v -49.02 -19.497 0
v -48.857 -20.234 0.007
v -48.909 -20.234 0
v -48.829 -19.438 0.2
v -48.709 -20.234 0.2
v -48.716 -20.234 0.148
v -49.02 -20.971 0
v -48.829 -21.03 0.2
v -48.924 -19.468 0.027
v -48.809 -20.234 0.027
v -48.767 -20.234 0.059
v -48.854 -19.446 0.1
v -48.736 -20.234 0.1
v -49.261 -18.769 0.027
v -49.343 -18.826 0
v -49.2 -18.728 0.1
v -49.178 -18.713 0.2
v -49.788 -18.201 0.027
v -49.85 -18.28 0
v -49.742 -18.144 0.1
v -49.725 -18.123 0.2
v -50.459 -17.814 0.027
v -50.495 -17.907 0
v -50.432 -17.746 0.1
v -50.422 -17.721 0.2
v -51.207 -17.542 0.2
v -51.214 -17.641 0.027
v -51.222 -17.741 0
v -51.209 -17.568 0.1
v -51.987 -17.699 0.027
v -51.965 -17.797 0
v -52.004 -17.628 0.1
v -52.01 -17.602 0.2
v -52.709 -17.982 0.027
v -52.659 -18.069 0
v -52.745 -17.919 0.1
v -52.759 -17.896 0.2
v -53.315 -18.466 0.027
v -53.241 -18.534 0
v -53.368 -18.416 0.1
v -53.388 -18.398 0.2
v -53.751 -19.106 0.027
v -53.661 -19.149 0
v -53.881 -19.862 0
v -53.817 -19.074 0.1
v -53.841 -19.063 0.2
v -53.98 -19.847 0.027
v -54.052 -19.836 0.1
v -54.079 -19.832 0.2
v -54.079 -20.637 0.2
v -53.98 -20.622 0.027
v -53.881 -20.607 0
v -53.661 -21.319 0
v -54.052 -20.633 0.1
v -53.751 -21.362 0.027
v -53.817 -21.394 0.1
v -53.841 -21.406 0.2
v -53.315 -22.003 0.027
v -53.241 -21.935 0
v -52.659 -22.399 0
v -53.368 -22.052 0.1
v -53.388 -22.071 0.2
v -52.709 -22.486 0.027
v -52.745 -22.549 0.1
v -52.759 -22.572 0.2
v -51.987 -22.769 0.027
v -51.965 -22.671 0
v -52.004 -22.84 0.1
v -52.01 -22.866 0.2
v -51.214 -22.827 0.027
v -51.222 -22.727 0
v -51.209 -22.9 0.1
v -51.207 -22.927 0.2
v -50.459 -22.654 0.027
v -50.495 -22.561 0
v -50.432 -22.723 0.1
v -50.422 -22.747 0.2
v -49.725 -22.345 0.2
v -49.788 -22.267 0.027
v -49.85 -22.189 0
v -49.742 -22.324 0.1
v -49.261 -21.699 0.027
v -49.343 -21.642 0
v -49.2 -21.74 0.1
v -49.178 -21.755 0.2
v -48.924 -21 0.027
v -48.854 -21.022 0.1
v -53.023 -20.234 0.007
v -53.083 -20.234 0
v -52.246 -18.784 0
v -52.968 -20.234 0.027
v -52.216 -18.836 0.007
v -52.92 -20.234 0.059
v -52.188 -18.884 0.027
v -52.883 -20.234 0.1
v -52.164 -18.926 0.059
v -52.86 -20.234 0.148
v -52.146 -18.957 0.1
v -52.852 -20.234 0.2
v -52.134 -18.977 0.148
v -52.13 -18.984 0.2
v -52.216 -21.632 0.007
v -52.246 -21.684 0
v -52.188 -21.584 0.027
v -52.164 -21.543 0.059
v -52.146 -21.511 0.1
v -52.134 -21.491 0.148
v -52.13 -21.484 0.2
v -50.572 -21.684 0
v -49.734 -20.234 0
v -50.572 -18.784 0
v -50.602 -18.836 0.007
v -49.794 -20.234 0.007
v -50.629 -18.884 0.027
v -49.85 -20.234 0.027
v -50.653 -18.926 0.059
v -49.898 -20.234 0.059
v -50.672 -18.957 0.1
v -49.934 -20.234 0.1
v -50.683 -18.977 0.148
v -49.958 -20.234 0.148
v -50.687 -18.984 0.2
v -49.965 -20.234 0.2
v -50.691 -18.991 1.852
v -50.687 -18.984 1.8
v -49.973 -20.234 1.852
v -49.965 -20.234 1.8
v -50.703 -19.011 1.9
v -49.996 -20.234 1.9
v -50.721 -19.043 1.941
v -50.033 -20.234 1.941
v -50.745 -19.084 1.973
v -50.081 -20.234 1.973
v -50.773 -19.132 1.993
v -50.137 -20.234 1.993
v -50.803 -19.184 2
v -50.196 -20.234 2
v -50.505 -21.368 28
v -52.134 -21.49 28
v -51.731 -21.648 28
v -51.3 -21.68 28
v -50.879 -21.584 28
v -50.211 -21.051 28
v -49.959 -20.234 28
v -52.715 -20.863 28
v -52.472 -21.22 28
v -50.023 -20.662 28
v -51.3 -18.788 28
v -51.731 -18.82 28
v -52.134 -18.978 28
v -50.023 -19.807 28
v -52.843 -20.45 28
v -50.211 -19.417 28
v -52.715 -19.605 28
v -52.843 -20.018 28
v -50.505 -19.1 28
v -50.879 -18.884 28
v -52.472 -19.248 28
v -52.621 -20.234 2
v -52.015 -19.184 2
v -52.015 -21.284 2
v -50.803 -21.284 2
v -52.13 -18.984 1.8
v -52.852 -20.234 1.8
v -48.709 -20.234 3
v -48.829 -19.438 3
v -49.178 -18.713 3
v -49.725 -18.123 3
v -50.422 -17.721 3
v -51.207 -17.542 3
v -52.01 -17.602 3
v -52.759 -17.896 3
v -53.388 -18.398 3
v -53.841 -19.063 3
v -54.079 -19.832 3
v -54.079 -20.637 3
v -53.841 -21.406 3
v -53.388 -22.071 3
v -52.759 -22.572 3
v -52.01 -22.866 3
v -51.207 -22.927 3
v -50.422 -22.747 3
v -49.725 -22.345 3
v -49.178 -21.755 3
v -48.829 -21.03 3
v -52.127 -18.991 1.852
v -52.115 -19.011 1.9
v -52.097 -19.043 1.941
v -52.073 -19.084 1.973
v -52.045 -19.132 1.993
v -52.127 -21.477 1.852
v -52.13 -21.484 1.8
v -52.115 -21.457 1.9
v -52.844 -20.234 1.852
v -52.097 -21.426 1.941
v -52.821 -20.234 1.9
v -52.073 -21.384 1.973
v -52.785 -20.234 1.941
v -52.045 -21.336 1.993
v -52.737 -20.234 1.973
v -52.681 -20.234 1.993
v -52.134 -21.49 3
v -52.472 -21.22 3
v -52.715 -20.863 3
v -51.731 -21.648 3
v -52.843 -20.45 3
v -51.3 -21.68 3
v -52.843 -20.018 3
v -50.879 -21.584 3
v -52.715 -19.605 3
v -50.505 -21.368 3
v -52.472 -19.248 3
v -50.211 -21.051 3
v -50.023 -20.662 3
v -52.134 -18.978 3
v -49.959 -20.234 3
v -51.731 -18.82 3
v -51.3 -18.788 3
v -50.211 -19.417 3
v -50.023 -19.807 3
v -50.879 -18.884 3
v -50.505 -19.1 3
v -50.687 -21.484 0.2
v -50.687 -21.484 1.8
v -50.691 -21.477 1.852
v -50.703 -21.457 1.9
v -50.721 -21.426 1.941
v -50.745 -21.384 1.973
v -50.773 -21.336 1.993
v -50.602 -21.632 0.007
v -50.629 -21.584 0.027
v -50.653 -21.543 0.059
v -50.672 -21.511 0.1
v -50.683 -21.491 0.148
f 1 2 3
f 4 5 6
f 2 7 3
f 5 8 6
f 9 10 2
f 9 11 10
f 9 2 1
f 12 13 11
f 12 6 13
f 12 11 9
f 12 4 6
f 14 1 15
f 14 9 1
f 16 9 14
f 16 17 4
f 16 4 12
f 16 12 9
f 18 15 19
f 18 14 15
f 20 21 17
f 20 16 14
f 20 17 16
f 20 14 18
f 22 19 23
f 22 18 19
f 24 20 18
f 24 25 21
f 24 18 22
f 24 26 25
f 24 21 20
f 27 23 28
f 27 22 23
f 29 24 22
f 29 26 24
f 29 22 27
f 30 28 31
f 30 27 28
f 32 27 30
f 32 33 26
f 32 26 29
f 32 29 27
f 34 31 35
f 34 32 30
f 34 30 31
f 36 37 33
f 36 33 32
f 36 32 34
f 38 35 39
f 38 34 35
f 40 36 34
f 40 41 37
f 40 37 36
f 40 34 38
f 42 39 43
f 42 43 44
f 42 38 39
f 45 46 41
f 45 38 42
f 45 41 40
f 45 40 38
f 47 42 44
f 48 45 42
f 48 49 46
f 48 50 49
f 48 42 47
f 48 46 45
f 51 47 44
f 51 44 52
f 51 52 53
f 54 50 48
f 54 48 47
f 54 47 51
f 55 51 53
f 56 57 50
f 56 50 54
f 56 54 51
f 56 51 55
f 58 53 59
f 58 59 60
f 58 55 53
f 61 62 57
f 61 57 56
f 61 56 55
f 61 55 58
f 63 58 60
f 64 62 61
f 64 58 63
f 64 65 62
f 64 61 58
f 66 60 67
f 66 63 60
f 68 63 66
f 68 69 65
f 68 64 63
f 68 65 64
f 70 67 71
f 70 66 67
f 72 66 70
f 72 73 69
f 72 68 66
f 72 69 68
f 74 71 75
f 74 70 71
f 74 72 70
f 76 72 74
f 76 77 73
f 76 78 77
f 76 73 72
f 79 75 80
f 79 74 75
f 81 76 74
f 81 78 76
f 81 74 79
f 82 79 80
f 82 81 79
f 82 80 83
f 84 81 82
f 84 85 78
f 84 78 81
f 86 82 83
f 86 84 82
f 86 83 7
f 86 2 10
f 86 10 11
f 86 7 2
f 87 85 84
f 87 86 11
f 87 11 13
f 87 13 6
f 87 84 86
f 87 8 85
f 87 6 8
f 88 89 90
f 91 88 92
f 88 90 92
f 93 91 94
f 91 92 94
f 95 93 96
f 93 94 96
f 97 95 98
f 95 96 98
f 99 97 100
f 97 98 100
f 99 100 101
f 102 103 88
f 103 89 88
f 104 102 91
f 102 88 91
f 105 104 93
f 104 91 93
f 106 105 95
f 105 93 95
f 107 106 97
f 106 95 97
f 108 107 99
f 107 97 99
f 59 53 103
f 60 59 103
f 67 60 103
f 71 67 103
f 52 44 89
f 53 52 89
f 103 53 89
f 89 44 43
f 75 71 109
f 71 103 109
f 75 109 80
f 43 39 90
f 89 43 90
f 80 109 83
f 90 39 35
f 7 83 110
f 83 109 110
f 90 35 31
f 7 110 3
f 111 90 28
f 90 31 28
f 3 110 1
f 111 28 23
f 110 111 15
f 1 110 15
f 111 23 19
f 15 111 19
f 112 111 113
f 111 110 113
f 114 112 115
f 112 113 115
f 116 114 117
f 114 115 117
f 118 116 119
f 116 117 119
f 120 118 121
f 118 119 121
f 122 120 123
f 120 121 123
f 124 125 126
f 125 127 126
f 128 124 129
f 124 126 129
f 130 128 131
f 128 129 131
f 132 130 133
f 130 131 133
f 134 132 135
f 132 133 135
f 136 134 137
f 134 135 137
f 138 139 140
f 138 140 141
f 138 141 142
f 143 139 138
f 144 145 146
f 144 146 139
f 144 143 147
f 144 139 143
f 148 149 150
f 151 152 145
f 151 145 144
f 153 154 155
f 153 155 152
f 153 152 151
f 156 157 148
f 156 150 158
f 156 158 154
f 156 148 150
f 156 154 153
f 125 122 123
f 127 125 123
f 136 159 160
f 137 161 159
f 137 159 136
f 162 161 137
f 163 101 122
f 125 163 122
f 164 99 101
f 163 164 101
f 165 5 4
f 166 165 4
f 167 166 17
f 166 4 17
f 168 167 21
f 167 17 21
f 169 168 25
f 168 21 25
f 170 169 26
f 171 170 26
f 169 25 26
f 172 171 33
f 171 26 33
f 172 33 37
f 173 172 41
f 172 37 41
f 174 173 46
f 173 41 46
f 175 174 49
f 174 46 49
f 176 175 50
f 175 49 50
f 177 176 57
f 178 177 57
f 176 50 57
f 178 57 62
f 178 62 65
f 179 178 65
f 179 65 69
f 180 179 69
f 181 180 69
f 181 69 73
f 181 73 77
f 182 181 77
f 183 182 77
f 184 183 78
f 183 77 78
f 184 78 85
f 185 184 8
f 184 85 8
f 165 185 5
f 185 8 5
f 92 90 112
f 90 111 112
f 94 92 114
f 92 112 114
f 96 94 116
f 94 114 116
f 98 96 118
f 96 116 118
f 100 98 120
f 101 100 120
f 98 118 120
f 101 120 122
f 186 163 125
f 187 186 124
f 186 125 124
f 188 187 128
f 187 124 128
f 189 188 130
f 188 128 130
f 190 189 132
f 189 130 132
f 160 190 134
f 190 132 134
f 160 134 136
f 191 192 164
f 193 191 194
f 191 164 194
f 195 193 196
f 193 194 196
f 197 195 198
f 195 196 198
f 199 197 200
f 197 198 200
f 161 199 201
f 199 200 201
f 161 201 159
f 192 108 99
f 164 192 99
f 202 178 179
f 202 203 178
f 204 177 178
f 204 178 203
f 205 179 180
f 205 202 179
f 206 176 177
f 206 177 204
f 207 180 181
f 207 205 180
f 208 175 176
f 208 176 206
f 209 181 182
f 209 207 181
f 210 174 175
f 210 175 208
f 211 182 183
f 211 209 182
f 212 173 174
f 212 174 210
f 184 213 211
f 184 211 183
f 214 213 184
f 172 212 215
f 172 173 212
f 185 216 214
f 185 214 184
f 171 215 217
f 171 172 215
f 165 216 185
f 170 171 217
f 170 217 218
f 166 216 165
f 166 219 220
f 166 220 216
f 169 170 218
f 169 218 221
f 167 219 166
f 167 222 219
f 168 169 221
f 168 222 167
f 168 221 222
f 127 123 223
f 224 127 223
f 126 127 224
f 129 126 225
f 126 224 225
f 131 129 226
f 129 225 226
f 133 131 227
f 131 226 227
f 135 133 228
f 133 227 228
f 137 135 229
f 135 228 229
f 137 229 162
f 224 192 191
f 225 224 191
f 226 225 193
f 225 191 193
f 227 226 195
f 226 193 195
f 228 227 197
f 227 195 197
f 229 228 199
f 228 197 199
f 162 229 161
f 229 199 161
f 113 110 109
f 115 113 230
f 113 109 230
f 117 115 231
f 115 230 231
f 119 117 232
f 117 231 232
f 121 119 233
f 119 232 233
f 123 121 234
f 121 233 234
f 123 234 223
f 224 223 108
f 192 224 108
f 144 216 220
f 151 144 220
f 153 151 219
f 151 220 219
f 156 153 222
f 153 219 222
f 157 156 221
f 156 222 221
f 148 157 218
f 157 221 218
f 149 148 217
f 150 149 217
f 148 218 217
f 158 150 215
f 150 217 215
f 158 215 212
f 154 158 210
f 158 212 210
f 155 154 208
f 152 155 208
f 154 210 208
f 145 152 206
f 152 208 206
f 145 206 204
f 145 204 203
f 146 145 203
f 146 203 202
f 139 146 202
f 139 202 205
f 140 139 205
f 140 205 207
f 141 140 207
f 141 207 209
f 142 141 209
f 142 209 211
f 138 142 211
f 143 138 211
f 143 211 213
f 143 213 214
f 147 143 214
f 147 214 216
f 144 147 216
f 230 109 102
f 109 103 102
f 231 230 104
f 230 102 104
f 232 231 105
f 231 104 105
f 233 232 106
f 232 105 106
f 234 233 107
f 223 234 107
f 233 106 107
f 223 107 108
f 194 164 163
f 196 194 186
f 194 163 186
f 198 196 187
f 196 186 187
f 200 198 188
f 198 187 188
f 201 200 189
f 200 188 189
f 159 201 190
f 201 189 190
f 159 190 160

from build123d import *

# Parameters (mm, degrees)
F0_R     = 2.7
F0_R_2   = 1.45
F1_DEPTH = 3
F2_DEPTH = 28
F4_DEPTH = 2
F5_R     = 0.2


with BuildPart() as f1:
    # F0 (on Top) → F1 (new body)
    with BuildSketch(Plane.XY):
        with Locations((-51.408798, -20.234108)):
            Circle(F0_R)
        with Locations((-51.408798, -20.234108)):
            Circle(F0_R_2, mode=Mode.SUBTRACT)
        with Locations((-51.408798, -20.234108)):
            Circle(F0_R_2)
    extrude(amount=F1_DEPTH)

    # F0 (on Top) → F2 (join)
    with BuildSketch(Plane.XY):
        with Locations((-51.408798, -20.234108)):
            Circle(F0_R_2)
    extrude(amount=F2_DEPTH)

    # F3 (on face) → F4 (cut)
    with BuildSketch(Plane(origin=(0, 0, 0), x_dir=(1, 0, 0), z_dir=(0, 0, -1))):
        Polygon((-52.130485, 18.984108), (-50.68711, 18.984108), (-49.965422, 20.234108), (-50.68711, 21.484108), (-52.130485, 21.484108), (-52.852173, 20.234108), align=None)
    extrude(amount=-F4_DEPTH, mode=Mode.SUBTRACT)

    # F5
    f5_edges = [f1.edges().sort_by_distance(p)[0] for p in [
        (-54.108798, -20.234108, 0),
        (-51.408798, -18.984108, 2),
        (-50.326266, -19.609108, 2),
        (-50.326266, -20.859108, 2),
        (-51.408798, -21.484108, 2),
        (-52.491329, -20.859108, 2),
        (-52.491329, -19.609108, 2),
        (-52.491329, -19.609108, 0),
        (-52.491329, -20.859108, 0),
        (-51.408798, -21.484108, 0),
        (-50.326266, -20.859108, 0),
        (-50.326266, -19.609108, 0),
        (-51.408798, -18.984108, 0),
    ]]
    fillet(f5_edges, radius=F5_R)


solid = f1.part
